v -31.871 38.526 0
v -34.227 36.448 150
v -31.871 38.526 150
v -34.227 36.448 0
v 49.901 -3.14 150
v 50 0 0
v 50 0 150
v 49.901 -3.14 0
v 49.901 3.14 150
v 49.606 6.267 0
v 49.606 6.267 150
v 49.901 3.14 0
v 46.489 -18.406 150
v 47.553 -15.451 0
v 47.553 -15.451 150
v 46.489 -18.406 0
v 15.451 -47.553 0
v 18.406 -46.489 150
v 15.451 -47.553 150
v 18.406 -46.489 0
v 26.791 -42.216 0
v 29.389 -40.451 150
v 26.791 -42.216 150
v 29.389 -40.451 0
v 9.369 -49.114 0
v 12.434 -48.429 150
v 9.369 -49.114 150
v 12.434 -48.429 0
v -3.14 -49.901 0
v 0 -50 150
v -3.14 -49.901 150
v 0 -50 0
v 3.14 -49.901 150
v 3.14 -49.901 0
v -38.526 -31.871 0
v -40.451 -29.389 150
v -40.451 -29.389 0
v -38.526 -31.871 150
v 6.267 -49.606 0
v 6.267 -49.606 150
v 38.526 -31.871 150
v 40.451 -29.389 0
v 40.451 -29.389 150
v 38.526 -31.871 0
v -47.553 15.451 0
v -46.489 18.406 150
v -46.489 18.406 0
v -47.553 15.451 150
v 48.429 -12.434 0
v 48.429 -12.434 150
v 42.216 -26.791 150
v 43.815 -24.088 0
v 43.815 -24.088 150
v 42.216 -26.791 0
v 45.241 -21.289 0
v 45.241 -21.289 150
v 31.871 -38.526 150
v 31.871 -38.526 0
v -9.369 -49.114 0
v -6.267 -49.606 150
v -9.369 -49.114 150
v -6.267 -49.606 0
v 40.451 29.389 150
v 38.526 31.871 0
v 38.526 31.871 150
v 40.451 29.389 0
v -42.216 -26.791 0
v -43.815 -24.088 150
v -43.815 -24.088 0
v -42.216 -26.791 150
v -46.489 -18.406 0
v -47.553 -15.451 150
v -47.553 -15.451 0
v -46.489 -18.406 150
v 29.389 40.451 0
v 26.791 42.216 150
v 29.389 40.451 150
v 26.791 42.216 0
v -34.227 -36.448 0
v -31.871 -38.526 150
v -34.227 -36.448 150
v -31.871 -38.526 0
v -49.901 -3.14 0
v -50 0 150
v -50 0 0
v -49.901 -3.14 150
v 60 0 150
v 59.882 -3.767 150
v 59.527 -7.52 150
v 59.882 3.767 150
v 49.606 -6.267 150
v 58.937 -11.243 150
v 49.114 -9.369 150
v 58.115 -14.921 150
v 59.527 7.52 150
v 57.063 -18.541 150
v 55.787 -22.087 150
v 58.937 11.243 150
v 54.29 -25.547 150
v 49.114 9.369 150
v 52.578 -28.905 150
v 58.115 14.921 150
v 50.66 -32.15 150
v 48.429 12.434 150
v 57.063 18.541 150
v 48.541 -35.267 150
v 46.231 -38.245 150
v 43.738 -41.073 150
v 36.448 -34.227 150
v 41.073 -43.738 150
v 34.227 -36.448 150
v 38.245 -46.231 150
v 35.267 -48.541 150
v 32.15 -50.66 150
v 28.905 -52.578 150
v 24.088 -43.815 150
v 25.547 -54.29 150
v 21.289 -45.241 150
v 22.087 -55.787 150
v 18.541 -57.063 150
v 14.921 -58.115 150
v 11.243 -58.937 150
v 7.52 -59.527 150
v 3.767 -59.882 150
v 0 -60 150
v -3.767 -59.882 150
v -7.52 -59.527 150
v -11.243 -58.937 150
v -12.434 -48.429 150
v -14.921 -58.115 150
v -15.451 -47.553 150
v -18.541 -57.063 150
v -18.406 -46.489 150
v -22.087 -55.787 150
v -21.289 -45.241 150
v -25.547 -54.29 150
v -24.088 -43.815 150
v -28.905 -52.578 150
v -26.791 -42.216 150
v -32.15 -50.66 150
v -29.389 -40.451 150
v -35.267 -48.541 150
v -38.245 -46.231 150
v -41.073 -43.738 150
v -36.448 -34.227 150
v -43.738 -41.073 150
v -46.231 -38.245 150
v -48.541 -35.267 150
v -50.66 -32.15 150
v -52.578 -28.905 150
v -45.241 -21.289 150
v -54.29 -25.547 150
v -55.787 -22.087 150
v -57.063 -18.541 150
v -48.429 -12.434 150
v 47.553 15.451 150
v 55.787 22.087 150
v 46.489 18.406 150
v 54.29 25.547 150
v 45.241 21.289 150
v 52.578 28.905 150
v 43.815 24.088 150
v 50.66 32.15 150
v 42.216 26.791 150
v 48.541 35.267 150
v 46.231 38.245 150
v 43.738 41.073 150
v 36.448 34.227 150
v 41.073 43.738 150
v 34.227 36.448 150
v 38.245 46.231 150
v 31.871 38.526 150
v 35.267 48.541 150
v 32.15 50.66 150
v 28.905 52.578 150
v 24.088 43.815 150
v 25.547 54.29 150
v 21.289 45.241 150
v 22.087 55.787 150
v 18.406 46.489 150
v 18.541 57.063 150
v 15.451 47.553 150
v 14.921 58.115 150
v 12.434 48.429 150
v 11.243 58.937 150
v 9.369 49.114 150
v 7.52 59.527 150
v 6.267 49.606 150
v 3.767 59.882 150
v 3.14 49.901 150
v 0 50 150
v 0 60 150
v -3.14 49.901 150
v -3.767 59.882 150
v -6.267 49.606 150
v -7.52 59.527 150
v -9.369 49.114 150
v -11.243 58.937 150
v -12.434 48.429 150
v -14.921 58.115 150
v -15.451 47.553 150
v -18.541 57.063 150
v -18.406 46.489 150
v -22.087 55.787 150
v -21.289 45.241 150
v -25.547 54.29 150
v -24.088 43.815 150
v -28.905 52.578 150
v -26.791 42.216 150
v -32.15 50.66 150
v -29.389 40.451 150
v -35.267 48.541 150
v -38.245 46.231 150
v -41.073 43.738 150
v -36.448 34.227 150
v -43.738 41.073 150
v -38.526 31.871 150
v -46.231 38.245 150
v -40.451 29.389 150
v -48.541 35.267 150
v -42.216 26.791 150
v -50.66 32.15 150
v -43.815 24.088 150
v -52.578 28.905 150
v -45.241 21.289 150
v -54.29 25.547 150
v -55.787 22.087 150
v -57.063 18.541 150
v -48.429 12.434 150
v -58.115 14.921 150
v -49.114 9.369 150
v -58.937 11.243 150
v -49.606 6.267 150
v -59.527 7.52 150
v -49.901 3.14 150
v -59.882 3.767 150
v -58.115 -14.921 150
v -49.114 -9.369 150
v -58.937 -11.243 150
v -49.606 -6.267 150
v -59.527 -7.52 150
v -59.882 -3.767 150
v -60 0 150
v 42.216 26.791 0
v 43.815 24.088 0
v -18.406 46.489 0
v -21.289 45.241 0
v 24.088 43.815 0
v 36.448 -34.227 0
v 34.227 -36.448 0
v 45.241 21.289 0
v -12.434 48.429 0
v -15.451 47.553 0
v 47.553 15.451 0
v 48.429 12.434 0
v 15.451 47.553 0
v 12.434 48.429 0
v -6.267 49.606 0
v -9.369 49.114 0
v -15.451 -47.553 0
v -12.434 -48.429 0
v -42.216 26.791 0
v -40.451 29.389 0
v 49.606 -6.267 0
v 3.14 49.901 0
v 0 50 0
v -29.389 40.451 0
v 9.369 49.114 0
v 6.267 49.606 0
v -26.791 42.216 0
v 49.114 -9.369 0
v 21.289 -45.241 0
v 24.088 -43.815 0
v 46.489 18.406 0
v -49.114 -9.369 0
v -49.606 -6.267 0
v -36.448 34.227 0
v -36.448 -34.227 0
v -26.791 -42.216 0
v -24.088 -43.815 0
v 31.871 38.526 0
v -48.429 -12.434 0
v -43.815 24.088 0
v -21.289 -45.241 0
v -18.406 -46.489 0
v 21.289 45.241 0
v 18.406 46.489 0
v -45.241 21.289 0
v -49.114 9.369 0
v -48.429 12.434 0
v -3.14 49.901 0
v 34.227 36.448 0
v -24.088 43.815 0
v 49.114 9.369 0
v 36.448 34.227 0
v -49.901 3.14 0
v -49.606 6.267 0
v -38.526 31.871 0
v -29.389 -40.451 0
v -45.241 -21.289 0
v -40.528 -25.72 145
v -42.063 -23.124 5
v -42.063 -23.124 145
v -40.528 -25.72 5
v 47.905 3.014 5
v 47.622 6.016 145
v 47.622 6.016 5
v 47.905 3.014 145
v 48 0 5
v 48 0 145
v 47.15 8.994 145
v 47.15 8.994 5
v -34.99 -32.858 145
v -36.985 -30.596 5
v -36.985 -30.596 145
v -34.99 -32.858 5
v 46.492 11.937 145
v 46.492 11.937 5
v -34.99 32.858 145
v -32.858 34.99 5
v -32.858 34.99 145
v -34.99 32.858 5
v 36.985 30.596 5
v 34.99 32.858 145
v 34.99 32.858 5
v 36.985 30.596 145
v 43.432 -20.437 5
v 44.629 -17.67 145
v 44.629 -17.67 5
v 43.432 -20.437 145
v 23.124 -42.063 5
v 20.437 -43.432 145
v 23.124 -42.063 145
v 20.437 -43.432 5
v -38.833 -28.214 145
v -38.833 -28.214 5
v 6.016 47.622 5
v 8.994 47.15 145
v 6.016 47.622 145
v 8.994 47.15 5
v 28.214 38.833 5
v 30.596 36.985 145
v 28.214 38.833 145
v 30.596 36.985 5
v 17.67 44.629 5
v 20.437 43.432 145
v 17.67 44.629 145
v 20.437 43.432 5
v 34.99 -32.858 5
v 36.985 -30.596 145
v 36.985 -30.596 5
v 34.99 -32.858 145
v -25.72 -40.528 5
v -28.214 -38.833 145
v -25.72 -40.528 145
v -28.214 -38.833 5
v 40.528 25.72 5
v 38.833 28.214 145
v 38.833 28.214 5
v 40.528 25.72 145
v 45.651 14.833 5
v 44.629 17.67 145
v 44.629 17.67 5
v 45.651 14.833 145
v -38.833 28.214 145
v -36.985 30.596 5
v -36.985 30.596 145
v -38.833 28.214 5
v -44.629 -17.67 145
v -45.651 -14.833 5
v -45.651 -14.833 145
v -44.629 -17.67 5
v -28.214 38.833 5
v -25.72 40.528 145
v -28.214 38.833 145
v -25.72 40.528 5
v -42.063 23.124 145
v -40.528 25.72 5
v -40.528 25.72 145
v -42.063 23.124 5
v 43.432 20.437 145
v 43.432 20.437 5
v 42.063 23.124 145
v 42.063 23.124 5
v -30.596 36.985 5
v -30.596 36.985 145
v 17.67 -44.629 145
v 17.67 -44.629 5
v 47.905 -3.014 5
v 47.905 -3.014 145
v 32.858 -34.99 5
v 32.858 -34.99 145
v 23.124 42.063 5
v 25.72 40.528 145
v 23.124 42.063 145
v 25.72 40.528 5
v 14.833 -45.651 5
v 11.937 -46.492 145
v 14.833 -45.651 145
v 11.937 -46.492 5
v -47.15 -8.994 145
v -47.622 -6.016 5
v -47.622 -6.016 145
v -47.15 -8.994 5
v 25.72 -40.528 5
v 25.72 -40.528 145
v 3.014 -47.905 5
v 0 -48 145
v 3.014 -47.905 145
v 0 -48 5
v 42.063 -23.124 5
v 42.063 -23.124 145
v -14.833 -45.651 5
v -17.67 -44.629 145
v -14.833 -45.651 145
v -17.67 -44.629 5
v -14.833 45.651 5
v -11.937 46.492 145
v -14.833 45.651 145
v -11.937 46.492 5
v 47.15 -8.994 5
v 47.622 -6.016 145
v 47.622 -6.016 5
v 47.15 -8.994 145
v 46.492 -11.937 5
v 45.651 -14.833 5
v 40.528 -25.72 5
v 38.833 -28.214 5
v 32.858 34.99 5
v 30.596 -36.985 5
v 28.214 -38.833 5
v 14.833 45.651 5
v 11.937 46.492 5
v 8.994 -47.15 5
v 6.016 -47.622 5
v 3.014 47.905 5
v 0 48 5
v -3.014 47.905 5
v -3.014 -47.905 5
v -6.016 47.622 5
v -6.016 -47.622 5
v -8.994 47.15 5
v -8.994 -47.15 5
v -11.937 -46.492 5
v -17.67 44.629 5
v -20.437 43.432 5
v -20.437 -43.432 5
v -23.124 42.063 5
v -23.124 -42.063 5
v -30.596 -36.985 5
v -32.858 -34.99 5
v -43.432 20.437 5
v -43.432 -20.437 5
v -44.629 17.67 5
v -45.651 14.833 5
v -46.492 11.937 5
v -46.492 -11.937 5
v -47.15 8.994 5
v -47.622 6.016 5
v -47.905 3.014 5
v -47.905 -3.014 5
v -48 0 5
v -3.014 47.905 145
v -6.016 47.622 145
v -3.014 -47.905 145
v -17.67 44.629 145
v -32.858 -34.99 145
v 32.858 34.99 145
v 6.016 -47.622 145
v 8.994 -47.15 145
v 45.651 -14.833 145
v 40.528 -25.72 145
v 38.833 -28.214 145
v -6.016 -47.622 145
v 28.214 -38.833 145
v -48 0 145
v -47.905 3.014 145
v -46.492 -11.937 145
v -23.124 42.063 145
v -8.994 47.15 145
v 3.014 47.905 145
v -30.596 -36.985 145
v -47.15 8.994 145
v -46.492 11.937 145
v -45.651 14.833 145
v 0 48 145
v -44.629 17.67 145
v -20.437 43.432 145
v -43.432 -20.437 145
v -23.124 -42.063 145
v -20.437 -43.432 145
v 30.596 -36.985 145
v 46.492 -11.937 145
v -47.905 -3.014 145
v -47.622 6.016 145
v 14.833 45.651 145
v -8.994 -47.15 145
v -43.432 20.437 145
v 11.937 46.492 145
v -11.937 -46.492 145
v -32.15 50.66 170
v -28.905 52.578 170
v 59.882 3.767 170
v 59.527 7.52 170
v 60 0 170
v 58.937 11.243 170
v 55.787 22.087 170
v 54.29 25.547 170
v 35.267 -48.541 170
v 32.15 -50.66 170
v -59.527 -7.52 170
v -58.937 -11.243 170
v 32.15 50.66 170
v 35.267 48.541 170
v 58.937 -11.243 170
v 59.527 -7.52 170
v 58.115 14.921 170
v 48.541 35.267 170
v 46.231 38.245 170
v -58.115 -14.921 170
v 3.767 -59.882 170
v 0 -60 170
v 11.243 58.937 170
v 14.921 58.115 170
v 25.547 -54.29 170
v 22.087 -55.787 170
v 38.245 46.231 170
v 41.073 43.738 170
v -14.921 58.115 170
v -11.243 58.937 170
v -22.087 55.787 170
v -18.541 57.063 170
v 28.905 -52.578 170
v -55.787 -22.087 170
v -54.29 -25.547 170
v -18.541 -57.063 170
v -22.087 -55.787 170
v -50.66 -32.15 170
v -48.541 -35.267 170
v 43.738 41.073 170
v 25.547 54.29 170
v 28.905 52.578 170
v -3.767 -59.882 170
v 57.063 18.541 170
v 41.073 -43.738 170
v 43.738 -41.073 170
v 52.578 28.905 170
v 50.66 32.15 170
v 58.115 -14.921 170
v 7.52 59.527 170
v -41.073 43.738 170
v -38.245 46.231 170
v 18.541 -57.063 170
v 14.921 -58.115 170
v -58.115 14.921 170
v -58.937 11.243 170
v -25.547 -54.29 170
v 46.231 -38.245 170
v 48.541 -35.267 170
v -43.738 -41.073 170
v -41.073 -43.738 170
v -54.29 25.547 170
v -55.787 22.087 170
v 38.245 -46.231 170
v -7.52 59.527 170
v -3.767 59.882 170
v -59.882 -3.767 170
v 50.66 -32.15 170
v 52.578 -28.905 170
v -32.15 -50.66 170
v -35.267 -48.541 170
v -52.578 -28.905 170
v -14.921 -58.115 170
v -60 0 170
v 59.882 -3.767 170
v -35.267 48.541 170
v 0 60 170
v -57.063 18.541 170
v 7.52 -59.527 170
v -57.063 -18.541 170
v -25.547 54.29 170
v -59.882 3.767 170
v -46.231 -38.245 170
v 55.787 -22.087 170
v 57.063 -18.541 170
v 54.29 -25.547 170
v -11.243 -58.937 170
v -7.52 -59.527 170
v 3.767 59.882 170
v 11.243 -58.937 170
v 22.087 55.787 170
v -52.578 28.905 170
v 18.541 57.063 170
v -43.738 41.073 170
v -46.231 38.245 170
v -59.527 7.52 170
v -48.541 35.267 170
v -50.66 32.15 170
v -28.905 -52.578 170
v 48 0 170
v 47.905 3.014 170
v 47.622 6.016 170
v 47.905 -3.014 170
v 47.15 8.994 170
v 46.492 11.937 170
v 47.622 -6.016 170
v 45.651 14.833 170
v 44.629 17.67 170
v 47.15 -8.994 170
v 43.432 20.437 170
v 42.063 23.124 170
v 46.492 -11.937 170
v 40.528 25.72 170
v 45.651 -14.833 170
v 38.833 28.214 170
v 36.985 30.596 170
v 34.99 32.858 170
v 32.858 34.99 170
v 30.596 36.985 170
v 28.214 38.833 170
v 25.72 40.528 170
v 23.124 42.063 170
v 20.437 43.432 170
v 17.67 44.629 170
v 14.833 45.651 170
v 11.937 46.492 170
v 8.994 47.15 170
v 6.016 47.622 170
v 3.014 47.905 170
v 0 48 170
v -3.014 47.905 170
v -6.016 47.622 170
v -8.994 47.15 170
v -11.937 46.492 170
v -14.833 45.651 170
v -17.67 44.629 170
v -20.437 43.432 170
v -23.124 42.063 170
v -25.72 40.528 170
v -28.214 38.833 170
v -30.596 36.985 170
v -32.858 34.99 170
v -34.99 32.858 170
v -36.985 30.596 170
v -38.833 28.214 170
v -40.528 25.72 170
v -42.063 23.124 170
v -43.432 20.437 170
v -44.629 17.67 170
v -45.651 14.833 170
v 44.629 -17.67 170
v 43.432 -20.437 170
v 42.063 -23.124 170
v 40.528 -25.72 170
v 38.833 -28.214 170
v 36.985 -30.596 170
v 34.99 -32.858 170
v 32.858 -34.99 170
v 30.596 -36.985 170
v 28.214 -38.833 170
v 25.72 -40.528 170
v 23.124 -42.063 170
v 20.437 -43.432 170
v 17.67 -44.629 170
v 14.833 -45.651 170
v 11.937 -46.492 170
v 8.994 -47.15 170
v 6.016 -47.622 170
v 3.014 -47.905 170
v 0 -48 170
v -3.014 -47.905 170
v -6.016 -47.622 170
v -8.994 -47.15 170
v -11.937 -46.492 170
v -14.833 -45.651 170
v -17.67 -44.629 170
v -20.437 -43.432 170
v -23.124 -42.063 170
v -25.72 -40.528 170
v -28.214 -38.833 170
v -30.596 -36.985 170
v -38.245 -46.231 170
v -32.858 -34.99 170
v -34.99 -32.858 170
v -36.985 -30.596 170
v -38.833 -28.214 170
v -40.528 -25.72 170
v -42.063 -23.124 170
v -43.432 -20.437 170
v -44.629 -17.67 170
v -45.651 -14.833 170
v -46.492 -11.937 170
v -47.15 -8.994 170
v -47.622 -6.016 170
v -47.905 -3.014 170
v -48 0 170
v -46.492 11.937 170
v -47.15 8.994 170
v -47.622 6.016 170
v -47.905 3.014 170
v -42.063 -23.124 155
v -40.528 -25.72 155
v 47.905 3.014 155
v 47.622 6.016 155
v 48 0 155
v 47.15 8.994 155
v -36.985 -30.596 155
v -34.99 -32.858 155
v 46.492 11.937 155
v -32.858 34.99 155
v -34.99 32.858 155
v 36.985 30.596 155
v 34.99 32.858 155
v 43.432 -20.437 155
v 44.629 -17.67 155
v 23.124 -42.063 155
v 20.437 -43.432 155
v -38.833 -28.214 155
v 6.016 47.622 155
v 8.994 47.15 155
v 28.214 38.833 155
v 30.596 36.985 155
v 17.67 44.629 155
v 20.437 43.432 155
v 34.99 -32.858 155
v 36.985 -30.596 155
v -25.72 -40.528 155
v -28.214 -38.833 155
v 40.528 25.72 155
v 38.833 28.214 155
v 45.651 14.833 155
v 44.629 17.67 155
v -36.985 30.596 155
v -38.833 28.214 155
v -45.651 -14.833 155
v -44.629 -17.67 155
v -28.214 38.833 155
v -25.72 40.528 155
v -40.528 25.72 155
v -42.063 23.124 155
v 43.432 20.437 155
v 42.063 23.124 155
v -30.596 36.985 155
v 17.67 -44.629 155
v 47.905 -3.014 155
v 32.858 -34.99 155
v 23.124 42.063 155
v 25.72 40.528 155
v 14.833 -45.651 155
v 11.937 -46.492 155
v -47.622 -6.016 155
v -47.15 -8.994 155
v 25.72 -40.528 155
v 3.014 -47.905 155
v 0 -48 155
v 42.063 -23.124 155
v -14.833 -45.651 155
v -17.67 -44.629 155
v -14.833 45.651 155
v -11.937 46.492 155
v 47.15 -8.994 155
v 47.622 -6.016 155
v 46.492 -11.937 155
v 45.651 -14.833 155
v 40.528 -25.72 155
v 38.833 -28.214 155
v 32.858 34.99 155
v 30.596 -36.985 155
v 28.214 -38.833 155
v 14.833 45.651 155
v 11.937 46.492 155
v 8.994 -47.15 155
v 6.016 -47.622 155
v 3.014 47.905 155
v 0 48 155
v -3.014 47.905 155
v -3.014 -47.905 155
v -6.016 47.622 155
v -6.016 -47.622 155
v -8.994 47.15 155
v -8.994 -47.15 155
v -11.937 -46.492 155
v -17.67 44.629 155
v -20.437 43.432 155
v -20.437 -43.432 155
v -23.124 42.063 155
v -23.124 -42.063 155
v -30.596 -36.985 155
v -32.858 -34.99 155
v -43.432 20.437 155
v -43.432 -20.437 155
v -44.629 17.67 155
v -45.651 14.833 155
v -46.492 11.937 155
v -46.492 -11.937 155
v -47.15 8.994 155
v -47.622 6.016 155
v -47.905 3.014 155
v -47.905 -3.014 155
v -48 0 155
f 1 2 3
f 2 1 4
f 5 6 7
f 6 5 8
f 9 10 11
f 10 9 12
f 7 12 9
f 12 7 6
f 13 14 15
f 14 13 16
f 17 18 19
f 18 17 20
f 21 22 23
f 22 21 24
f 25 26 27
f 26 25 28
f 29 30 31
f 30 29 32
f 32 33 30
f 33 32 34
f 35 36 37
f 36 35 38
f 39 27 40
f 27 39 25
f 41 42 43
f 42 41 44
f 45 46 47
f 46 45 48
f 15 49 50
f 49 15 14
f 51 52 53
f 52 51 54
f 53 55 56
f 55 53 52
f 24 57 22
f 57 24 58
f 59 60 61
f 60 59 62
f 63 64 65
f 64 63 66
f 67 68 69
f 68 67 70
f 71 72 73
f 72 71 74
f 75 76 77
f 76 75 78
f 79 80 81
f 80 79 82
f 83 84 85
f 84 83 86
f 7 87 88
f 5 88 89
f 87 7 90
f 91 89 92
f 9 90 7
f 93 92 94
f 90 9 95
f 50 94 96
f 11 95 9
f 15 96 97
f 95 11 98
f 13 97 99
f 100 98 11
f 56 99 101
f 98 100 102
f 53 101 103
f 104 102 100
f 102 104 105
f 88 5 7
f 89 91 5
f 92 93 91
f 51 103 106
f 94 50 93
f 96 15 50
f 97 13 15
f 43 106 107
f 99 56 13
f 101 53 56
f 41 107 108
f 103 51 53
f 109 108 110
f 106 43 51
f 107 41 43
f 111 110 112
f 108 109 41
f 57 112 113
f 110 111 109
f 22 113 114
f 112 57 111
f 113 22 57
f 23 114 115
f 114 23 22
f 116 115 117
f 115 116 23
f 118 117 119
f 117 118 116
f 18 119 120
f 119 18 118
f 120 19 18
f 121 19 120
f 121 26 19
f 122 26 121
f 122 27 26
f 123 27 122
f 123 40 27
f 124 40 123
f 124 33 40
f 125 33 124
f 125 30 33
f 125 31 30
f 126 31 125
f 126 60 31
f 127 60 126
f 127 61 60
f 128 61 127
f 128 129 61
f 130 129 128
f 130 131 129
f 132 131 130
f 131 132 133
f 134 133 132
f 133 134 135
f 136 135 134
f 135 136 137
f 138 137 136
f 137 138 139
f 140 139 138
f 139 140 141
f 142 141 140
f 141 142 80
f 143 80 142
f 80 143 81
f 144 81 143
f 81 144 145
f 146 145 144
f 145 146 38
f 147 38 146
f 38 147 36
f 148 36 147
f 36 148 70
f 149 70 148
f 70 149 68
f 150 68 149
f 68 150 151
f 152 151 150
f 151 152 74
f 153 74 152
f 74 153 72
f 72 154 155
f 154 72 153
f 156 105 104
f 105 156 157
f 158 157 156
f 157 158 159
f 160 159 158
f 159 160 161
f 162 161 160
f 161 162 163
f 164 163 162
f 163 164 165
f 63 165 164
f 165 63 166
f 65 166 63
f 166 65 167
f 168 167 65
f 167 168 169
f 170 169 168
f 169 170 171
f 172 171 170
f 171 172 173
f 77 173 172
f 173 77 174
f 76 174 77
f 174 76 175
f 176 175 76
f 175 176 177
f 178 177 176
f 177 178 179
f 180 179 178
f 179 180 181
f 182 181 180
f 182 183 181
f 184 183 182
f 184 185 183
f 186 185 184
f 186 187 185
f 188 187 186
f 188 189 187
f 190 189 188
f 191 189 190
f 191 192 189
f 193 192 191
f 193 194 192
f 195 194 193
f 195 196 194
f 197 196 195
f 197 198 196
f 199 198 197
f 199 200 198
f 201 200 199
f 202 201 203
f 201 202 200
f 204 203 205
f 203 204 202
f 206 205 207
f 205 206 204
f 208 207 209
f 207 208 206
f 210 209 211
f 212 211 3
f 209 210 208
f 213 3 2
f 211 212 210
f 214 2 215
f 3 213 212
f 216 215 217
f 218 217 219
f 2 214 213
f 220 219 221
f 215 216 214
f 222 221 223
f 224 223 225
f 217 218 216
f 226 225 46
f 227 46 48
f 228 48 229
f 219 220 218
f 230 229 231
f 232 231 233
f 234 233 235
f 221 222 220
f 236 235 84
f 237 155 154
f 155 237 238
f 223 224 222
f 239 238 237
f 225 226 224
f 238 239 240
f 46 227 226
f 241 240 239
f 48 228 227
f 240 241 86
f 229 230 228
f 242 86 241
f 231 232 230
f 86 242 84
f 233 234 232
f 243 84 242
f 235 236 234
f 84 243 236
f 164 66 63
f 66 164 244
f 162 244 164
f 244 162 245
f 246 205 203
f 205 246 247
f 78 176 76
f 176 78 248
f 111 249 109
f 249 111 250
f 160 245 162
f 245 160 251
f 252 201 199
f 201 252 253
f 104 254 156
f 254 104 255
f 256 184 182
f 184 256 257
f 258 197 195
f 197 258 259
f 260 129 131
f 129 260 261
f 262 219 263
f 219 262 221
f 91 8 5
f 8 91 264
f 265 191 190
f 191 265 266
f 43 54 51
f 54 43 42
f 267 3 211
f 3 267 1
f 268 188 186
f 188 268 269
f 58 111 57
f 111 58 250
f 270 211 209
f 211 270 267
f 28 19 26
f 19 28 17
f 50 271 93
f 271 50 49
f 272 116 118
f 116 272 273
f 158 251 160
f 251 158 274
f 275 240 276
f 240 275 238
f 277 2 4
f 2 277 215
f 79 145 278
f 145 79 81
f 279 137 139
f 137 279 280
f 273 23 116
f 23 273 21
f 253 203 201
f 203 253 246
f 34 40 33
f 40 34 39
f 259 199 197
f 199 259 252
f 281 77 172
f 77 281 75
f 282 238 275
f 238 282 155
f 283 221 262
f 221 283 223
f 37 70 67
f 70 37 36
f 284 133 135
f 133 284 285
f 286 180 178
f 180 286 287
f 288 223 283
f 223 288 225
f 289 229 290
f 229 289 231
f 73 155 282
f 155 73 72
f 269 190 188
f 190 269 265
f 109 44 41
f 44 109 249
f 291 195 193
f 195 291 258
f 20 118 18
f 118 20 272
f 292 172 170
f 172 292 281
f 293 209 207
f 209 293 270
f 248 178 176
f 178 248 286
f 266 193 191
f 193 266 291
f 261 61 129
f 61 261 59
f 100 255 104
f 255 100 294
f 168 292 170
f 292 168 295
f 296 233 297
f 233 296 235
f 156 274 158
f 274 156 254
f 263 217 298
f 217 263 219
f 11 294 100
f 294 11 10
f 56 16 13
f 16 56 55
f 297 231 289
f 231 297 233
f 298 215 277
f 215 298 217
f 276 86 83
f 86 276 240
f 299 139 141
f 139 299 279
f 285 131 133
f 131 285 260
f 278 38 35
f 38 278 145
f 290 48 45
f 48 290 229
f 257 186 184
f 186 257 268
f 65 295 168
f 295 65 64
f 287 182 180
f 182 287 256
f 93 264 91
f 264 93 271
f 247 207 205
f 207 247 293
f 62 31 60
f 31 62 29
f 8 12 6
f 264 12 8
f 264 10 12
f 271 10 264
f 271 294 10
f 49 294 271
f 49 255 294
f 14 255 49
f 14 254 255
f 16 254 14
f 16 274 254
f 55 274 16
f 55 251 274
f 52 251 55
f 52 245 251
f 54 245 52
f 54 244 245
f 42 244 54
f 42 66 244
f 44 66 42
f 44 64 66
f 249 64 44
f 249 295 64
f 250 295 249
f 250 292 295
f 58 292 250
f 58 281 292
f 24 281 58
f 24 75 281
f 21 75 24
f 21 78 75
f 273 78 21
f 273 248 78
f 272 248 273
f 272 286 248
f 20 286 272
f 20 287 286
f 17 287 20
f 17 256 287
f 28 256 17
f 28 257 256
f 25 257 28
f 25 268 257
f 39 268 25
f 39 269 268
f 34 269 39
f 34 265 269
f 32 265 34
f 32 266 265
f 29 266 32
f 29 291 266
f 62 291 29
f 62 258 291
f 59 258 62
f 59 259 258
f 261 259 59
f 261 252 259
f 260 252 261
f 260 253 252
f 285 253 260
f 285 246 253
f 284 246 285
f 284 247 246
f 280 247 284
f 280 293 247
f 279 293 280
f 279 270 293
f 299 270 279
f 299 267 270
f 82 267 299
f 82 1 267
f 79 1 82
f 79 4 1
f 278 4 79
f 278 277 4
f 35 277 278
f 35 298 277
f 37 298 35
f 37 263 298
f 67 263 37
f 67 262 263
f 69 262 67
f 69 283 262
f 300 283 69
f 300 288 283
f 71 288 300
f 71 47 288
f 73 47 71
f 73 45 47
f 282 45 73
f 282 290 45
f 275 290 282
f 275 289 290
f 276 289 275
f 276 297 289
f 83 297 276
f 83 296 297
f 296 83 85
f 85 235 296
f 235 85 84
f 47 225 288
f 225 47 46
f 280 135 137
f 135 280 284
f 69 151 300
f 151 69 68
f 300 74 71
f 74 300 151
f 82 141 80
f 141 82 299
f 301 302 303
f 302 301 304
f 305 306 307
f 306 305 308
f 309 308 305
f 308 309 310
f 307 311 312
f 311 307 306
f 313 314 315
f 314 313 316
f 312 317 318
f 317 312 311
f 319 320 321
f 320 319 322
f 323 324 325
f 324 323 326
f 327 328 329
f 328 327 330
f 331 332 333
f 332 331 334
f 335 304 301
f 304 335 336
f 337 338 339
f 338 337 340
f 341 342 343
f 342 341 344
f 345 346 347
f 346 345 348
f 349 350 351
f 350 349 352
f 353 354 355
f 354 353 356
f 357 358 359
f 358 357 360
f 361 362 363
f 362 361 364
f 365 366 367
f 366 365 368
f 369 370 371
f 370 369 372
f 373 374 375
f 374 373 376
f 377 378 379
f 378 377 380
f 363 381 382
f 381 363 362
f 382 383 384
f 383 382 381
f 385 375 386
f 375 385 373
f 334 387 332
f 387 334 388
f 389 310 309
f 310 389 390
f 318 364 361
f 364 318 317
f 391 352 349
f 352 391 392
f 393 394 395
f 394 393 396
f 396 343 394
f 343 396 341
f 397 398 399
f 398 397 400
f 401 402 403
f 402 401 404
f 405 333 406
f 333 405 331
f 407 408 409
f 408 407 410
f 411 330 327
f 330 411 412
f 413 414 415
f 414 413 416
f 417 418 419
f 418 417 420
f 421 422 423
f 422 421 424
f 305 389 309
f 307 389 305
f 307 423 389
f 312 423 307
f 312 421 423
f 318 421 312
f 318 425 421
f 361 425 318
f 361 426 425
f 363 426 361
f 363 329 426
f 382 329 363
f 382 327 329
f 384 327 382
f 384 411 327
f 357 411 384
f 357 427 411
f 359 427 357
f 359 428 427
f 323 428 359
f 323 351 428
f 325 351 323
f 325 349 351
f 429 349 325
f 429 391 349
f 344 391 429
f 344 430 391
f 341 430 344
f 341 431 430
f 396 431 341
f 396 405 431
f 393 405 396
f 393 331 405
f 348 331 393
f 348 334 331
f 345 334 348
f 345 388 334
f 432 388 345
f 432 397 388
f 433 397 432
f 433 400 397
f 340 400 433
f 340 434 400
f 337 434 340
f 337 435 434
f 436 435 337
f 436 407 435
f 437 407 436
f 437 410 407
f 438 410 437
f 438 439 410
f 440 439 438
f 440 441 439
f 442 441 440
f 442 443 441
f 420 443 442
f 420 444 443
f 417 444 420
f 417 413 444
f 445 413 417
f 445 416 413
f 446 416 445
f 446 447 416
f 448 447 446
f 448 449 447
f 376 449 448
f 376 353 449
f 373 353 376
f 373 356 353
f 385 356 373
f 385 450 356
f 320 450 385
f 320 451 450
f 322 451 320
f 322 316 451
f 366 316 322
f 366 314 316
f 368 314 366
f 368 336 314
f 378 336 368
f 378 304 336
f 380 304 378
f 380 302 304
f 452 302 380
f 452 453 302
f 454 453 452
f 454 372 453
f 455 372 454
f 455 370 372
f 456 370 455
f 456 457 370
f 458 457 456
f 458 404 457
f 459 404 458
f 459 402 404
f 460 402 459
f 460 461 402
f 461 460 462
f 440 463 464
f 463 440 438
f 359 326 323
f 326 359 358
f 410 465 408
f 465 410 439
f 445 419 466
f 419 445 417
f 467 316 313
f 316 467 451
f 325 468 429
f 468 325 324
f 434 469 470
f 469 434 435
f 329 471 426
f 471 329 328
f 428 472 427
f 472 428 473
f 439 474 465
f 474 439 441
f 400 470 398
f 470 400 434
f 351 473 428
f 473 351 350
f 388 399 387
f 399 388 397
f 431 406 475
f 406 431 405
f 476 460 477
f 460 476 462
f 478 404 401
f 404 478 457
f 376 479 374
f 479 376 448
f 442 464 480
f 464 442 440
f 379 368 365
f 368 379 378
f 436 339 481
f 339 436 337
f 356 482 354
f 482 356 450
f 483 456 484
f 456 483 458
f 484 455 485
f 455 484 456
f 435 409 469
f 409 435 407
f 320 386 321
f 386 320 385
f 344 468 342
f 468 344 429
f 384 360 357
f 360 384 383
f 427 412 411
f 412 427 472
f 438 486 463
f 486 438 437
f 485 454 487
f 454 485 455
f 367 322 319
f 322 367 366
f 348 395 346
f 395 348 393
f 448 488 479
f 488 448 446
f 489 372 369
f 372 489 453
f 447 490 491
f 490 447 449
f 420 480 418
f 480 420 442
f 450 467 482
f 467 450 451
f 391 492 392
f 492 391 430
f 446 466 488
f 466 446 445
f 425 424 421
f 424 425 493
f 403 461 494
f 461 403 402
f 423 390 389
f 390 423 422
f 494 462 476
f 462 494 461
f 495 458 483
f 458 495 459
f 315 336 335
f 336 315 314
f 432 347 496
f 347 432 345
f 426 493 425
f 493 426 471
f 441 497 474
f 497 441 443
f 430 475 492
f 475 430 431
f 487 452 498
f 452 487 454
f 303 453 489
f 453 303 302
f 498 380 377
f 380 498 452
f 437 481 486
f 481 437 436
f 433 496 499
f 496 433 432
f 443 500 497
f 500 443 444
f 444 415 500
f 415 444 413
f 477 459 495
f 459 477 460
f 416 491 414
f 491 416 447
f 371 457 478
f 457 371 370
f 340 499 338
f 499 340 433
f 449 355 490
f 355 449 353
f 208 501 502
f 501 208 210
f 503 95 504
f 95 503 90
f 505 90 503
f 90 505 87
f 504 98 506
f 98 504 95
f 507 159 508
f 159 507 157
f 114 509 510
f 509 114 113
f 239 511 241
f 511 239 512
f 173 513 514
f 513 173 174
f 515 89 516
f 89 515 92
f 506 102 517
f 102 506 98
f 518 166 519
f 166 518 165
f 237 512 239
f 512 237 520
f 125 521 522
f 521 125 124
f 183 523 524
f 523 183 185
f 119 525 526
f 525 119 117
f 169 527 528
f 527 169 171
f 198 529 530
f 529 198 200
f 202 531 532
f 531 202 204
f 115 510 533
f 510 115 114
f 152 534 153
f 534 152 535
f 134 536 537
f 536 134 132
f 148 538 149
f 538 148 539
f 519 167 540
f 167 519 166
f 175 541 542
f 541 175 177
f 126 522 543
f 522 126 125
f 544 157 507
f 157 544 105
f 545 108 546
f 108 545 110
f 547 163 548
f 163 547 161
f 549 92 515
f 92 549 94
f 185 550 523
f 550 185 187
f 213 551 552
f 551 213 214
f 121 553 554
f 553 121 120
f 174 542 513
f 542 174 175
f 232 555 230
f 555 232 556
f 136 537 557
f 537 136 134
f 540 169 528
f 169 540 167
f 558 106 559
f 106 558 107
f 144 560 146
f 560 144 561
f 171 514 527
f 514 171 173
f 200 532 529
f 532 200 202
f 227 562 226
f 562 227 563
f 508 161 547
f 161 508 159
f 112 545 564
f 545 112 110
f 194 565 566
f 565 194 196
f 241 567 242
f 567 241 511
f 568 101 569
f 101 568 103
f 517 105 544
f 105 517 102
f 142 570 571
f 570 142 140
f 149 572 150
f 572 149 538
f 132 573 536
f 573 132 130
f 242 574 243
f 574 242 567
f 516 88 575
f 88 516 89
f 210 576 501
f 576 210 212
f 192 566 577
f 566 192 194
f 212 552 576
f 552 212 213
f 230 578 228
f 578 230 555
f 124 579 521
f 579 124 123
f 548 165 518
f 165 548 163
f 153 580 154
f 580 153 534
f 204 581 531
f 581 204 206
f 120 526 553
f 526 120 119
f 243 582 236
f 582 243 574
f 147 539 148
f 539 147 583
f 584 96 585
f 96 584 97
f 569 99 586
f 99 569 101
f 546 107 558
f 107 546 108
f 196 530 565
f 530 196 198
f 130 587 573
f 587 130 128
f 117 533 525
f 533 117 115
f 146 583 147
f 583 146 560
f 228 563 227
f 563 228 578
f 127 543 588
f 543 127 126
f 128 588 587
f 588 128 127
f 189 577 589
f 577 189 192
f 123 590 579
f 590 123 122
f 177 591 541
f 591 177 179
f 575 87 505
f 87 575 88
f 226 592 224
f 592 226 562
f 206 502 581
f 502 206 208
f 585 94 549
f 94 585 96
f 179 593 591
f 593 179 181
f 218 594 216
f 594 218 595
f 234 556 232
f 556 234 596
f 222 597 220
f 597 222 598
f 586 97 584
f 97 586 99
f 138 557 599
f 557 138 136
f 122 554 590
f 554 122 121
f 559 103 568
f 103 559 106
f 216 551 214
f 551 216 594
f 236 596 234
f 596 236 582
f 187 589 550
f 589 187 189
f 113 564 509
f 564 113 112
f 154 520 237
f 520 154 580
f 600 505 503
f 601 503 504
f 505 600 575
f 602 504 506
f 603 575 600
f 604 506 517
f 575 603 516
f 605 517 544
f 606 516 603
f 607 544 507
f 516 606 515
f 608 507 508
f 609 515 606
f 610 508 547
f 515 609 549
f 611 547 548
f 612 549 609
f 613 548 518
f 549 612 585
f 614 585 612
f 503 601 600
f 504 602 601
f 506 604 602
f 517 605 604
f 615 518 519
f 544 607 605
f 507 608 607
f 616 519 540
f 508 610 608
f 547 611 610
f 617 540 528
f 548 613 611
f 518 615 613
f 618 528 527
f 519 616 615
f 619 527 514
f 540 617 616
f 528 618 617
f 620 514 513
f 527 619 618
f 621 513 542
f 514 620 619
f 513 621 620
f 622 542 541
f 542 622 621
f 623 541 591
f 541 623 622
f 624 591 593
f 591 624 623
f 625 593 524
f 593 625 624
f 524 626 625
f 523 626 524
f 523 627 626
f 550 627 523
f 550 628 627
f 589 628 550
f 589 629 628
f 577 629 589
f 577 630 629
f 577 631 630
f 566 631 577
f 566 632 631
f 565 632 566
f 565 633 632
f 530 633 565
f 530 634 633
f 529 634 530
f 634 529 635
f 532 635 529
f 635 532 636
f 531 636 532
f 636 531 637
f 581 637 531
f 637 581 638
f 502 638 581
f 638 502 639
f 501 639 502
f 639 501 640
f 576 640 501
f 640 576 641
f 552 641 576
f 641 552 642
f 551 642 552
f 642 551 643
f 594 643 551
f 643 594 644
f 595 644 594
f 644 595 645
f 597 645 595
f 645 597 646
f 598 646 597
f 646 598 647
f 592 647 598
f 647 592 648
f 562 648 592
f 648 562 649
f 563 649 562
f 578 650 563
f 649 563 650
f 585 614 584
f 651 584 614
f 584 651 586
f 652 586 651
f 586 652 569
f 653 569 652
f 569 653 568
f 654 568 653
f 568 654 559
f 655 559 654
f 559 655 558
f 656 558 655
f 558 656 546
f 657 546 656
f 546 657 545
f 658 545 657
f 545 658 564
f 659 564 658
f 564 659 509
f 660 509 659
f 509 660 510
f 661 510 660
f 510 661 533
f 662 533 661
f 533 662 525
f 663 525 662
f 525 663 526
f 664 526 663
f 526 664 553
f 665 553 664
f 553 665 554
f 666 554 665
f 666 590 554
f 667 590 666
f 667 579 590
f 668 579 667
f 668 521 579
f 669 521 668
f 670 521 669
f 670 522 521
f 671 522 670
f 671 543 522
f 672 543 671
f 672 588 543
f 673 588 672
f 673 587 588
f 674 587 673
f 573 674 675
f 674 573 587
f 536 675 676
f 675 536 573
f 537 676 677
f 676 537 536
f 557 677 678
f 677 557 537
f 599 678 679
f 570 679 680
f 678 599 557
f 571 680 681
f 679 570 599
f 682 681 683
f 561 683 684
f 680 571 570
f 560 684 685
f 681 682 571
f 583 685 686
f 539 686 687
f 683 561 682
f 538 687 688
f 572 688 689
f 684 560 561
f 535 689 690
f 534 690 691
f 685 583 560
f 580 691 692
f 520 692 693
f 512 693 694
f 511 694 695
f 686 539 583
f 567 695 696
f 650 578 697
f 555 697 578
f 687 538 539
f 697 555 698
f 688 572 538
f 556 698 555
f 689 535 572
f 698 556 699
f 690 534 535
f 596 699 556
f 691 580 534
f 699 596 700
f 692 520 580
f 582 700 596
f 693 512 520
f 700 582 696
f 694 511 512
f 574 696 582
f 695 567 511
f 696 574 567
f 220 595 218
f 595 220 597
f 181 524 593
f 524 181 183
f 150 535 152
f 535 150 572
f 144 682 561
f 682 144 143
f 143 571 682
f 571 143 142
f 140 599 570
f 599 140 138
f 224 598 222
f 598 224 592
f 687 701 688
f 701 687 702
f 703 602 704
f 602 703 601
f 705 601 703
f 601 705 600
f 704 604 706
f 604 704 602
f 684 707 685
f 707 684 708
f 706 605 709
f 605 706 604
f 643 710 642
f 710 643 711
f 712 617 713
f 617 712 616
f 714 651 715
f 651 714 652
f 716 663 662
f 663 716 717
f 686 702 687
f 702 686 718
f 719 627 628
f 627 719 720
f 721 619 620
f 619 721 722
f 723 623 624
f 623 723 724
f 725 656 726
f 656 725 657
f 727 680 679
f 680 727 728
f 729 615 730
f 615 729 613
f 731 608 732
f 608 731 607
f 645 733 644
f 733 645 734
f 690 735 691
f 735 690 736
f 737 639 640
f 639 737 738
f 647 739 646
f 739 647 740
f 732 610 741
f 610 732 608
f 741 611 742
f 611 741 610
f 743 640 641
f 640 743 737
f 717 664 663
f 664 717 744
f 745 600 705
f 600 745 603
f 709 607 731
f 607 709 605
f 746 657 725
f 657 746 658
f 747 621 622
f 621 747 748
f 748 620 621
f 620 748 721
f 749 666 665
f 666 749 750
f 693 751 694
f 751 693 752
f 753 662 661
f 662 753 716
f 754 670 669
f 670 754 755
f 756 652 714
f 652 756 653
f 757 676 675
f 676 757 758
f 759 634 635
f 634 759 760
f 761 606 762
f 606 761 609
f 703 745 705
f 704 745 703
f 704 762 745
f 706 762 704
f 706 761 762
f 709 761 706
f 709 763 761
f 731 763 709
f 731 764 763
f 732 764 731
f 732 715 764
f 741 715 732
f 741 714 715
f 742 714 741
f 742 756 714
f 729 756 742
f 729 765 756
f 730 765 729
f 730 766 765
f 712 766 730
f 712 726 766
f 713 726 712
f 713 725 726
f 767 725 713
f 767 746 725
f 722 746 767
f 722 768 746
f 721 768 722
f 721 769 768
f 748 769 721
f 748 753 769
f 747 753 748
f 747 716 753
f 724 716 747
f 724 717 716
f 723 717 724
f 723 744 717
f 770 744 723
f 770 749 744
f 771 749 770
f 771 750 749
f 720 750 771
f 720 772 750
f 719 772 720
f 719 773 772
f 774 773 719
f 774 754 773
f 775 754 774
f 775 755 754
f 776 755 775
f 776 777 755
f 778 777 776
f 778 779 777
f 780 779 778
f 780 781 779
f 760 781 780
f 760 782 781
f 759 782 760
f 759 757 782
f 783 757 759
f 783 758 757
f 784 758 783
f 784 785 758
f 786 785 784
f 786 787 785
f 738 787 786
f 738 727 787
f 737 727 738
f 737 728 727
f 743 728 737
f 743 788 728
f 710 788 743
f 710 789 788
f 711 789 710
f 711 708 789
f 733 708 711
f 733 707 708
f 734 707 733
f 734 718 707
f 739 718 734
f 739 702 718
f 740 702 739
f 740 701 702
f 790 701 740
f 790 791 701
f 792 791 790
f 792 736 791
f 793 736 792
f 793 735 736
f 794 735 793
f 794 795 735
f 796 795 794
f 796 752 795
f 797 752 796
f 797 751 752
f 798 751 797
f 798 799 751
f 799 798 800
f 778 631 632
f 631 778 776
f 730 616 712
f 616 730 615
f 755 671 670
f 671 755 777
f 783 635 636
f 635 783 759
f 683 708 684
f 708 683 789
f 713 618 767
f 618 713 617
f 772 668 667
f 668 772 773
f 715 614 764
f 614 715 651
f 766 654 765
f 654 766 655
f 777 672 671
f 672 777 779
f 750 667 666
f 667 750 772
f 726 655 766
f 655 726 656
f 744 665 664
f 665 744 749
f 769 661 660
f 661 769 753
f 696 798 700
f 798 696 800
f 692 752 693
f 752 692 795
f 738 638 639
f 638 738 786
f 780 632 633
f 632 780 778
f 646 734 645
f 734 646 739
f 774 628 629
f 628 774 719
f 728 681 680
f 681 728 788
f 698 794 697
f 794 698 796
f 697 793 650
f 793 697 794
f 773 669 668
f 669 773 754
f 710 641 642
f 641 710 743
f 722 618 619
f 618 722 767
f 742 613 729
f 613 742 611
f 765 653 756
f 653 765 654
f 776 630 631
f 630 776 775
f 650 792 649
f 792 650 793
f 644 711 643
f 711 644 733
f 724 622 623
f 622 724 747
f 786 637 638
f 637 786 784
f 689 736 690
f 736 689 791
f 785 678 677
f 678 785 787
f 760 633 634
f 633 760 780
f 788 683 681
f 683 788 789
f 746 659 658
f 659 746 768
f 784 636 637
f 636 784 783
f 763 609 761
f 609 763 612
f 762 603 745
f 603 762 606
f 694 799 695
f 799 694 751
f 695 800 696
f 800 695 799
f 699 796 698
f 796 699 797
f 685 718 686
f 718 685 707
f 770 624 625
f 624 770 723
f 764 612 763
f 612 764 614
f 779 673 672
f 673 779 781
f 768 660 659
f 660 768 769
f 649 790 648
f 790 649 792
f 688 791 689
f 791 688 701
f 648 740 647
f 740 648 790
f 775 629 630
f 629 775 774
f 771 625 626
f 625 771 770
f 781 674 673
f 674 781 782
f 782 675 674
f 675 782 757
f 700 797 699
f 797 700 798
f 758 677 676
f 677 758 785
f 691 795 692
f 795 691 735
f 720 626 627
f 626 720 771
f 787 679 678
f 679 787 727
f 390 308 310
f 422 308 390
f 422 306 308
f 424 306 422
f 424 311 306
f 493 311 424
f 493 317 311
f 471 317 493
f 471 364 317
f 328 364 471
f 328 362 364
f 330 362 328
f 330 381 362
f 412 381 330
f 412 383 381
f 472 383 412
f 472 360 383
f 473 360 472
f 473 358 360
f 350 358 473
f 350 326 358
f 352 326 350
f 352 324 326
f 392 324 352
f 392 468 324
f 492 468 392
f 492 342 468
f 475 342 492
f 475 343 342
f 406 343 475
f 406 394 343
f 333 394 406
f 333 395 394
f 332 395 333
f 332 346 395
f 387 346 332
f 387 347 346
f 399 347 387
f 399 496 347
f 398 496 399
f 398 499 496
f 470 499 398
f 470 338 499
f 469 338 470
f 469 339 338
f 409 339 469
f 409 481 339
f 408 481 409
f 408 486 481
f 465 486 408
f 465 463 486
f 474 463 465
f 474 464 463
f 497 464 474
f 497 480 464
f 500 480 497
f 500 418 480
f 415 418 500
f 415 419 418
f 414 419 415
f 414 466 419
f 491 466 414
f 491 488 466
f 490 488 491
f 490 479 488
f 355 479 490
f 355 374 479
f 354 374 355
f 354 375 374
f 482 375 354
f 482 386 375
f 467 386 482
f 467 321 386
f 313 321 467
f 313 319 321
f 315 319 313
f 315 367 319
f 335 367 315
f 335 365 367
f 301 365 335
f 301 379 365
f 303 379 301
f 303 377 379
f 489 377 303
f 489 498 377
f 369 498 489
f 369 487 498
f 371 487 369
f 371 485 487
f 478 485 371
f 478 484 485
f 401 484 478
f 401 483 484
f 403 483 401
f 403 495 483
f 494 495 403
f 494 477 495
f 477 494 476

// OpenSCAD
// Container and Lid Dimensions
container_diameter = 100; // Diameter of the container in mm
container_height = 150;   // Height of the container in mm
lid_overhang = 20;        // Overhang of the lid in mm
lid_height = 20;          // Height of the lid in mm
thread_height = 5;        // Height of the screw thread in mm
thread_pitch = 2;         // Pitch of the screw thread in mm

module container() {
    difference() {
        // Main body of the container
        cylinder(d = container_diameter, h = container_height, $fn=100);
        // Hollow out the container
        translate([0, 0, thread_height])
            cylinder(d = container_diameter - 4, h = container_height - thread_height, $fn=100);
    }
}

module lid() {
    difference() {
        // Main body of the lid
        cylinder(d = container_diameter + lid_overhang, h = lid_height, $fn=100);
        // Hollow out the lid
        translate([0, 0, thread_height])
            cylinder(d = container_diameter - 4, h = lid_height - thread_height, $fn=100);
    }
}

module screw_thread() {
    // Placeholder for screw thread implementation
    // Note: OpenSCAD does not natively support threads, consider using a library or custom implementation
    // This is a simplified representation
    translate([0, 0, container_height - thread_height])
        cylinder(d = container_diameter - 2, h = thread_height, $fn=100);
}

module star() {
    // Define the star shape using the polygon function
    polygon(points=[
        [0, 5], [1.18, 1.62], [4.76, 1.62], [1.9, -0.62], [3.09, -4.24],
        [0, -2], [-3.09, -4.24], [-1.9, -0.62], [-4.76, 1.62], [-1.18, 1.62]
    ]);
}

module model() {
    container();
    translate([0, 0, container_height])
        lid();
    screw_thread();
    // Add the star on the side of the container
    translate([container_diameter / 2 + 1, 0, container_height / 2])
        rotate([0, 90, 0])
        star();
}

model();
